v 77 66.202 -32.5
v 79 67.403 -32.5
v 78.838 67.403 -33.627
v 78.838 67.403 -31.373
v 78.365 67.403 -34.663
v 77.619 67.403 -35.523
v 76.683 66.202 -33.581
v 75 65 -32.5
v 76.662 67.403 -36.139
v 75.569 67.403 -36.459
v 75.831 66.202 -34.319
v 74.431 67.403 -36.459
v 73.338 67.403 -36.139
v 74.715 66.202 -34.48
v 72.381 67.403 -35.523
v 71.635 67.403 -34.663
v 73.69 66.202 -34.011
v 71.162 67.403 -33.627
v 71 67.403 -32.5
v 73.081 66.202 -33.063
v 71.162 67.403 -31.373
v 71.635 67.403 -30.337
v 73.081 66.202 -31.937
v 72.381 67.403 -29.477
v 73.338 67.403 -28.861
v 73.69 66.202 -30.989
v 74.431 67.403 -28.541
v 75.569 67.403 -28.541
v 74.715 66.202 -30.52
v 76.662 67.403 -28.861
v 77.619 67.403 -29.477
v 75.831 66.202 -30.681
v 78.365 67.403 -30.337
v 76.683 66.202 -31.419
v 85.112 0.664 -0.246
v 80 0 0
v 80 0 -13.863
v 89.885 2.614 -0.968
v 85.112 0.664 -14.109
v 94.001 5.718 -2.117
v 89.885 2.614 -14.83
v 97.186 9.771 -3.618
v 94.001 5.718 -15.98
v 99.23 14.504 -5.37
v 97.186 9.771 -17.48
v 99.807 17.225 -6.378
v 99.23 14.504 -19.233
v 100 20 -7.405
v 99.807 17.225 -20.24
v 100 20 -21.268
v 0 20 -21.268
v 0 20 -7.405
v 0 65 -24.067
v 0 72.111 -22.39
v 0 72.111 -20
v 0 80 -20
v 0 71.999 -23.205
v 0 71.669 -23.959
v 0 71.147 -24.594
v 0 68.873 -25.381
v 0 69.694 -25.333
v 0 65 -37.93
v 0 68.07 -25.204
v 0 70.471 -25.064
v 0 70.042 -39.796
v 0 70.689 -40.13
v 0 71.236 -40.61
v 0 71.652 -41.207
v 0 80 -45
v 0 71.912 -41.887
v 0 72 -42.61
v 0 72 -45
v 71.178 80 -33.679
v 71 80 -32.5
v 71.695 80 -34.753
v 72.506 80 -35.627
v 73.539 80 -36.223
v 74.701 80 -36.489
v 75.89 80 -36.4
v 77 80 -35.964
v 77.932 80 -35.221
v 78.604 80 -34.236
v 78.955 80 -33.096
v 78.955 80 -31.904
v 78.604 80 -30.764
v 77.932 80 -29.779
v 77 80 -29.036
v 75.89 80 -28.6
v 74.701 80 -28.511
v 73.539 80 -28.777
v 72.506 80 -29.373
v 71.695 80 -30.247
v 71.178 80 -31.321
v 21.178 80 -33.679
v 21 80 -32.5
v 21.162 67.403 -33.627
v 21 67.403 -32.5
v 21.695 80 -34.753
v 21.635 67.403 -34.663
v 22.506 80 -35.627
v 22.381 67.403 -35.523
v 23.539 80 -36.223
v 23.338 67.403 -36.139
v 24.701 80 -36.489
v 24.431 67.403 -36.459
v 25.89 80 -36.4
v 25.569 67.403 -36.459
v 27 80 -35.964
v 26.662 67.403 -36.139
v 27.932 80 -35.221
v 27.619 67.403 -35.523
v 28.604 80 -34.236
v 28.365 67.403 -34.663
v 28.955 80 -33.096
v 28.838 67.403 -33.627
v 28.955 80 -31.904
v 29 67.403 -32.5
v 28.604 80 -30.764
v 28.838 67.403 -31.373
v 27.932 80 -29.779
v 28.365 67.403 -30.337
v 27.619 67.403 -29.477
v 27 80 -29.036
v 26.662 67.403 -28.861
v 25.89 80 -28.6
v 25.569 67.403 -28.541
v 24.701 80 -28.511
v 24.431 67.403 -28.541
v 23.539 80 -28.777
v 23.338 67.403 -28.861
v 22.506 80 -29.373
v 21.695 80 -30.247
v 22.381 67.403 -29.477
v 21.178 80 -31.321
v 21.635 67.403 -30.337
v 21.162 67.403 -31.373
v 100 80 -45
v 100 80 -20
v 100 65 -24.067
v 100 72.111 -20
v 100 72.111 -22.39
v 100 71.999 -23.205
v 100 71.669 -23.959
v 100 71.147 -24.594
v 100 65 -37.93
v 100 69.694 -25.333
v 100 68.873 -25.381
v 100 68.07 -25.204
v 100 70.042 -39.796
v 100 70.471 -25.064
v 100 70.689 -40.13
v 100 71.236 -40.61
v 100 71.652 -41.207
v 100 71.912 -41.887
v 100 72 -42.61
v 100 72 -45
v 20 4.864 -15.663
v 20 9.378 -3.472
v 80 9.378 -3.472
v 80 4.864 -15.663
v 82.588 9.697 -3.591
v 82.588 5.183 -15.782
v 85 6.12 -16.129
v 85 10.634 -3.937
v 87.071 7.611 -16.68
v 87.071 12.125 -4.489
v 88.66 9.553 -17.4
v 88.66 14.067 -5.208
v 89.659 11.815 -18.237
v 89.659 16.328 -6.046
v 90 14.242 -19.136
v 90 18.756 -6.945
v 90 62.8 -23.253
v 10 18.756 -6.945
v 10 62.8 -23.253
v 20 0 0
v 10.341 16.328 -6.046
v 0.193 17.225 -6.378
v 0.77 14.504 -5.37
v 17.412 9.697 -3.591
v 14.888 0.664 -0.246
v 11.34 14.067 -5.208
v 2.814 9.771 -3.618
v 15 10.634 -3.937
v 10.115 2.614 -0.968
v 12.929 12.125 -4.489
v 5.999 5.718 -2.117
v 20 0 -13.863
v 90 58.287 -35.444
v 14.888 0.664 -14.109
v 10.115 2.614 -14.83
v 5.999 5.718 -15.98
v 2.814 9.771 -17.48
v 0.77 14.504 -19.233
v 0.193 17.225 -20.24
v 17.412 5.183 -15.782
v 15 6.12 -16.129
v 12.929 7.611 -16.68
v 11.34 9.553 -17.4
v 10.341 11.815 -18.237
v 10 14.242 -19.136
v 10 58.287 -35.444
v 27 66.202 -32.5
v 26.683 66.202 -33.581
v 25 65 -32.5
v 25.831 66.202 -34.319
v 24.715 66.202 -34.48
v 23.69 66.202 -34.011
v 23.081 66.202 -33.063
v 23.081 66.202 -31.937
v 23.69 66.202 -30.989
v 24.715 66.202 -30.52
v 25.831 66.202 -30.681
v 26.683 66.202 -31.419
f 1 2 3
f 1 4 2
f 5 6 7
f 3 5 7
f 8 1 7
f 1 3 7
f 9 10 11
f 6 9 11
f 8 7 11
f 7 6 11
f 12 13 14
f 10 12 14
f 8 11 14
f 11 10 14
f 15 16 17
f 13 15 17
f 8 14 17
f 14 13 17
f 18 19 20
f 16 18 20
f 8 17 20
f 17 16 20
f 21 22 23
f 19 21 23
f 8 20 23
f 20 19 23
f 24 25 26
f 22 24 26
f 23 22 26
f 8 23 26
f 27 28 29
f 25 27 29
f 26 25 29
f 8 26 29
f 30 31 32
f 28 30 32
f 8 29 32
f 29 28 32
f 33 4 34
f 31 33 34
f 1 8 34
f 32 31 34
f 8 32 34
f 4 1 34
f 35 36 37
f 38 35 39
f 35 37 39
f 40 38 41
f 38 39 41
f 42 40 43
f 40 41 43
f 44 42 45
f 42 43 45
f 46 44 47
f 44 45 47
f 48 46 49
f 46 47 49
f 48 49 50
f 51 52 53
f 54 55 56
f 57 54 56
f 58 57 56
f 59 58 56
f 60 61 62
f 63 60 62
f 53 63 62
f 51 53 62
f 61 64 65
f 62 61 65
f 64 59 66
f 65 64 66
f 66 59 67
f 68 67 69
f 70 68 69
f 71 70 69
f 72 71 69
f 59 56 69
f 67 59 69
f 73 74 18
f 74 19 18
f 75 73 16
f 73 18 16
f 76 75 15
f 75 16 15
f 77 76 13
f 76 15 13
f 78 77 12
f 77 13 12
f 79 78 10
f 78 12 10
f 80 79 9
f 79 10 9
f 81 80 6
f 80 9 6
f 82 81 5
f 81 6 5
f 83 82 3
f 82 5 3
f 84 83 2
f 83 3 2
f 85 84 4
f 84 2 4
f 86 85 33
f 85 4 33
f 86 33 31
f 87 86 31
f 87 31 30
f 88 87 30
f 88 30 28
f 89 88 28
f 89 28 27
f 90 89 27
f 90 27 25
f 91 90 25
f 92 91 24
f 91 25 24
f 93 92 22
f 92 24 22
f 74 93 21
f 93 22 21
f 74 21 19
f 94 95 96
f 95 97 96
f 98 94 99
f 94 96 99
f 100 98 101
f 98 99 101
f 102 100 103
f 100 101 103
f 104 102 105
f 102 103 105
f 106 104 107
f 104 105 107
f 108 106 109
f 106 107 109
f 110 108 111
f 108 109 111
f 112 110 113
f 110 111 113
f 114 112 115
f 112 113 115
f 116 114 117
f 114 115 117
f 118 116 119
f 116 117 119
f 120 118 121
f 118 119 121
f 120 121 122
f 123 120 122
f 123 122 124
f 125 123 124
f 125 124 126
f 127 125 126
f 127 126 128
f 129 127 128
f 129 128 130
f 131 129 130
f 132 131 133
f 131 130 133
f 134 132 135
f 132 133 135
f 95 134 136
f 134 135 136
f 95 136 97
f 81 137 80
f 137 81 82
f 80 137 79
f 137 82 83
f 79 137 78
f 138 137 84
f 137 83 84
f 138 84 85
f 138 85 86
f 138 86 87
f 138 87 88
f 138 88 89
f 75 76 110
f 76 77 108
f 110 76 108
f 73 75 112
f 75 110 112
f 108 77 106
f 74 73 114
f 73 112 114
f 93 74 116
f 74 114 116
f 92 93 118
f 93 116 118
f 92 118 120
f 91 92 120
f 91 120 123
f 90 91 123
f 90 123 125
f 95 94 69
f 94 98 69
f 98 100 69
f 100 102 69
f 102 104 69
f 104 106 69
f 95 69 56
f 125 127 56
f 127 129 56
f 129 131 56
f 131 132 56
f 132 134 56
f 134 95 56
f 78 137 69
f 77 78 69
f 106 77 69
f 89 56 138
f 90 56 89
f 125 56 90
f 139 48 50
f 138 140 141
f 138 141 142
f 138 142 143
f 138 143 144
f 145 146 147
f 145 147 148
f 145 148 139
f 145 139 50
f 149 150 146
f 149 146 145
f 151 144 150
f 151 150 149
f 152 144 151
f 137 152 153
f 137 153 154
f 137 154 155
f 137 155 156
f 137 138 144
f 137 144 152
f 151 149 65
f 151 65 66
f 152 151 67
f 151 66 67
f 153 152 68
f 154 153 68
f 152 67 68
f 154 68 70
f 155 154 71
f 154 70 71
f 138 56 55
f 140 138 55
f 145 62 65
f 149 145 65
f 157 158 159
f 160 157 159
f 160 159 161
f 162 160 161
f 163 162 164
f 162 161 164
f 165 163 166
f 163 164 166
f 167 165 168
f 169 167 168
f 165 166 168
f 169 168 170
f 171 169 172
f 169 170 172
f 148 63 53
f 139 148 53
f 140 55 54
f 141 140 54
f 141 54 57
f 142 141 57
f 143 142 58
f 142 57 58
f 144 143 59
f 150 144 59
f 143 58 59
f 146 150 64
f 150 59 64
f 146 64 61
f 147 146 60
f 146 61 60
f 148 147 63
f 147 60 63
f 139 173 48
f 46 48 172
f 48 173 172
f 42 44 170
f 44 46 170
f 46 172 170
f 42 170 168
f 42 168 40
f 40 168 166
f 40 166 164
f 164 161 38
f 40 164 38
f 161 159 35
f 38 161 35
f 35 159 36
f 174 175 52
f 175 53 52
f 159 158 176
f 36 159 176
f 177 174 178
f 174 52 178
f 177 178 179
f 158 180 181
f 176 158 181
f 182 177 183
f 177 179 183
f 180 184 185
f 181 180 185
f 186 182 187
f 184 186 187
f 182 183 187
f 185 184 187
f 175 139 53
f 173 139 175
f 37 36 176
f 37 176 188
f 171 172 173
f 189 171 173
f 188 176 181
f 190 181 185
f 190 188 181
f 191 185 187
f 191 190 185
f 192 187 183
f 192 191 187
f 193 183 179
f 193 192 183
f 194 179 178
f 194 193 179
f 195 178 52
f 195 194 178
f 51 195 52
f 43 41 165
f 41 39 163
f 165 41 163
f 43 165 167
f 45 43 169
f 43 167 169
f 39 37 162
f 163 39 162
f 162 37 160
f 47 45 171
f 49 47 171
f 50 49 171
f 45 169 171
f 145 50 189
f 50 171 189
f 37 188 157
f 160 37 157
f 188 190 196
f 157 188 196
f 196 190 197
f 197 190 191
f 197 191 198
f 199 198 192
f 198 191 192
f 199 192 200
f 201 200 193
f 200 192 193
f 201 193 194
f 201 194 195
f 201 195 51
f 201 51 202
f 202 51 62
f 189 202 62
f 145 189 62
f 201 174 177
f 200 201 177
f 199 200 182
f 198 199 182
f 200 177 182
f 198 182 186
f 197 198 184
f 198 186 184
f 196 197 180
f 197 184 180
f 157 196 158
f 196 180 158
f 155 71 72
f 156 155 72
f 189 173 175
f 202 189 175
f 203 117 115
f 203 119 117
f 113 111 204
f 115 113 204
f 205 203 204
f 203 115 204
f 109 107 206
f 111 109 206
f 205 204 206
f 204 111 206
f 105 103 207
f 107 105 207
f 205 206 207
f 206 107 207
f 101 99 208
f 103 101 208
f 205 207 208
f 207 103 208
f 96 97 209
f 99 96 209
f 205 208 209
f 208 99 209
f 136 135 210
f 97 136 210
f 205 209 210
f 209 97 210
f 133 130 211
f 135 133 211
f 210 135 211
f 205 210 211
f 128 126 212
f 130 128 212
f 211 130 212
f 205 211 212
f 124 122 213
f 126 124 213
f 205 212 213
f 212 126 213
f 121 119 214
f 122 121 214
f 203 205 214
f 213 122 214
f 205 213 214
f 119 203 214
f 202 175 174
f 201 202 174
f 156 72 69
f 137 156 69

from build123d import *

# Parameters (mm, degrees)
BOSS_EXTRUDE1_DEPTH       = 100
FILLET1_R                 = 20
FILLET2_R                 = 20
CUT_EXTRUDE1_DEPTH        = 13
F_1_0MM_DOWEL_HOLE1_D     = 8
F_1_0MM_DOWEL_HOLE1_DEPTH = 12.596557524
F_1_0MM_DOWEL_HOLE1_TIP   = 2.403442476


with BuildPart() as part:
    # Sketch3 → Boss-Extrude1 (new body)
    with BuildSketch(Plane(origin=(0, 0, 0), x_dir=(0, 0, -1), z_dir=(1, 0, 0))):
        Polygon((24.06709422, 65), (0, 0), (13.862503416, 0), (37.929597637, 65), align=None)
        with BuildLine():
            Line((25.203655824, 68.069606309), (24.06709422, 65))
            Line((24.06709422, 65), (37.929597637, 65))
            Line((37.929597637, 65), (39.796344176, 70.041677401))
            ThreePointArc((39.796344176, 70.041677401), (40.895779886, 71.46221772), (42.609688839, 72))
            Line((42.609688839, 72), (45, 72))
            Line((45, 72), (45, 80))
            Line((45, 80), (20, 80))
            Line((20, 80), (20, 72.11128371))
            Line((20, 72.11128371), (22.390311161, 72.11128371))
            ThreePointArc((22.390311161, 72.11128371), (24.852528882, 70.825192663), (25.203655824, 68.069606309))
        make_face()
    extrude(amount=BOSS_EXTRUDE1_DEPTH)

    # Fillet1
    fillet1_edges = [part.edges().sort_by_distance(p)[0] for p in [
        (100, 0, -6.931251708),
    ]]
    fillet(fillet1_edges, radius=FILLET1_R)

    # Fillet2
    fillet2_edges = [part.edges().sort_by_distance(p)[0] for p in [
        (0, 0, -6.931251708),
    ]]
    fillet(fillet2_edges, radius=FILLET2_R)

    # Sketch4 → Cut-Extrude1 (cut)
    with BuildSketch(Plane(origin=(0, 0, 0), x_dir=(1, 0, 0), z_dir=(0, 0.34722580038254636, 0.9377815542804733))):
        with BuildLine():
            Line((10, 66.96704035), (10, 20))
            ThreePointArc((10, 20), (12.928932188, 12.928932188), (20, 10))
            Line((20, 10), (80, 10))
            ThreePointArc((80, 10), (87.071067812, 12.928932188), (90, 20))
            Line((90, 20), (90, 66.96704035))
            Line((90, 66.96704035), (10, 66.96704035))
        make_face()
    extrude(amount=-CUT_EXTRUDE1_DEPTH, mode=Mode.SUBTRACT)

    # Ø1.0mm Dowel Hole1
    with Locations(Plane(origin=(0, 80, 0), x_dir=(1, 0, 0), z_dir=(0, 1, 0))):
        with Locations((25, 32.5), (75, 32.5)):
            Hole(F_1_0MM_DOWEL_HOLE1_D / 2, depth=F_1_0MM_DOWEL_HOLE1_DEPTH)
            with Locations((0, 0, -(F_1_0MM_DOWEL_HOLE1_DEPTH + F_1_0MM_DOWEL_HOLE1_TIP / 2))):  # 118° drill point
                Cone(0, F_1_0MM_DOWEL_HOLE1_D / 2, F_1_0MM_DOWEL_HOLE1_TIP, mode=Mode.SUBTRACT)


solid = part.part
